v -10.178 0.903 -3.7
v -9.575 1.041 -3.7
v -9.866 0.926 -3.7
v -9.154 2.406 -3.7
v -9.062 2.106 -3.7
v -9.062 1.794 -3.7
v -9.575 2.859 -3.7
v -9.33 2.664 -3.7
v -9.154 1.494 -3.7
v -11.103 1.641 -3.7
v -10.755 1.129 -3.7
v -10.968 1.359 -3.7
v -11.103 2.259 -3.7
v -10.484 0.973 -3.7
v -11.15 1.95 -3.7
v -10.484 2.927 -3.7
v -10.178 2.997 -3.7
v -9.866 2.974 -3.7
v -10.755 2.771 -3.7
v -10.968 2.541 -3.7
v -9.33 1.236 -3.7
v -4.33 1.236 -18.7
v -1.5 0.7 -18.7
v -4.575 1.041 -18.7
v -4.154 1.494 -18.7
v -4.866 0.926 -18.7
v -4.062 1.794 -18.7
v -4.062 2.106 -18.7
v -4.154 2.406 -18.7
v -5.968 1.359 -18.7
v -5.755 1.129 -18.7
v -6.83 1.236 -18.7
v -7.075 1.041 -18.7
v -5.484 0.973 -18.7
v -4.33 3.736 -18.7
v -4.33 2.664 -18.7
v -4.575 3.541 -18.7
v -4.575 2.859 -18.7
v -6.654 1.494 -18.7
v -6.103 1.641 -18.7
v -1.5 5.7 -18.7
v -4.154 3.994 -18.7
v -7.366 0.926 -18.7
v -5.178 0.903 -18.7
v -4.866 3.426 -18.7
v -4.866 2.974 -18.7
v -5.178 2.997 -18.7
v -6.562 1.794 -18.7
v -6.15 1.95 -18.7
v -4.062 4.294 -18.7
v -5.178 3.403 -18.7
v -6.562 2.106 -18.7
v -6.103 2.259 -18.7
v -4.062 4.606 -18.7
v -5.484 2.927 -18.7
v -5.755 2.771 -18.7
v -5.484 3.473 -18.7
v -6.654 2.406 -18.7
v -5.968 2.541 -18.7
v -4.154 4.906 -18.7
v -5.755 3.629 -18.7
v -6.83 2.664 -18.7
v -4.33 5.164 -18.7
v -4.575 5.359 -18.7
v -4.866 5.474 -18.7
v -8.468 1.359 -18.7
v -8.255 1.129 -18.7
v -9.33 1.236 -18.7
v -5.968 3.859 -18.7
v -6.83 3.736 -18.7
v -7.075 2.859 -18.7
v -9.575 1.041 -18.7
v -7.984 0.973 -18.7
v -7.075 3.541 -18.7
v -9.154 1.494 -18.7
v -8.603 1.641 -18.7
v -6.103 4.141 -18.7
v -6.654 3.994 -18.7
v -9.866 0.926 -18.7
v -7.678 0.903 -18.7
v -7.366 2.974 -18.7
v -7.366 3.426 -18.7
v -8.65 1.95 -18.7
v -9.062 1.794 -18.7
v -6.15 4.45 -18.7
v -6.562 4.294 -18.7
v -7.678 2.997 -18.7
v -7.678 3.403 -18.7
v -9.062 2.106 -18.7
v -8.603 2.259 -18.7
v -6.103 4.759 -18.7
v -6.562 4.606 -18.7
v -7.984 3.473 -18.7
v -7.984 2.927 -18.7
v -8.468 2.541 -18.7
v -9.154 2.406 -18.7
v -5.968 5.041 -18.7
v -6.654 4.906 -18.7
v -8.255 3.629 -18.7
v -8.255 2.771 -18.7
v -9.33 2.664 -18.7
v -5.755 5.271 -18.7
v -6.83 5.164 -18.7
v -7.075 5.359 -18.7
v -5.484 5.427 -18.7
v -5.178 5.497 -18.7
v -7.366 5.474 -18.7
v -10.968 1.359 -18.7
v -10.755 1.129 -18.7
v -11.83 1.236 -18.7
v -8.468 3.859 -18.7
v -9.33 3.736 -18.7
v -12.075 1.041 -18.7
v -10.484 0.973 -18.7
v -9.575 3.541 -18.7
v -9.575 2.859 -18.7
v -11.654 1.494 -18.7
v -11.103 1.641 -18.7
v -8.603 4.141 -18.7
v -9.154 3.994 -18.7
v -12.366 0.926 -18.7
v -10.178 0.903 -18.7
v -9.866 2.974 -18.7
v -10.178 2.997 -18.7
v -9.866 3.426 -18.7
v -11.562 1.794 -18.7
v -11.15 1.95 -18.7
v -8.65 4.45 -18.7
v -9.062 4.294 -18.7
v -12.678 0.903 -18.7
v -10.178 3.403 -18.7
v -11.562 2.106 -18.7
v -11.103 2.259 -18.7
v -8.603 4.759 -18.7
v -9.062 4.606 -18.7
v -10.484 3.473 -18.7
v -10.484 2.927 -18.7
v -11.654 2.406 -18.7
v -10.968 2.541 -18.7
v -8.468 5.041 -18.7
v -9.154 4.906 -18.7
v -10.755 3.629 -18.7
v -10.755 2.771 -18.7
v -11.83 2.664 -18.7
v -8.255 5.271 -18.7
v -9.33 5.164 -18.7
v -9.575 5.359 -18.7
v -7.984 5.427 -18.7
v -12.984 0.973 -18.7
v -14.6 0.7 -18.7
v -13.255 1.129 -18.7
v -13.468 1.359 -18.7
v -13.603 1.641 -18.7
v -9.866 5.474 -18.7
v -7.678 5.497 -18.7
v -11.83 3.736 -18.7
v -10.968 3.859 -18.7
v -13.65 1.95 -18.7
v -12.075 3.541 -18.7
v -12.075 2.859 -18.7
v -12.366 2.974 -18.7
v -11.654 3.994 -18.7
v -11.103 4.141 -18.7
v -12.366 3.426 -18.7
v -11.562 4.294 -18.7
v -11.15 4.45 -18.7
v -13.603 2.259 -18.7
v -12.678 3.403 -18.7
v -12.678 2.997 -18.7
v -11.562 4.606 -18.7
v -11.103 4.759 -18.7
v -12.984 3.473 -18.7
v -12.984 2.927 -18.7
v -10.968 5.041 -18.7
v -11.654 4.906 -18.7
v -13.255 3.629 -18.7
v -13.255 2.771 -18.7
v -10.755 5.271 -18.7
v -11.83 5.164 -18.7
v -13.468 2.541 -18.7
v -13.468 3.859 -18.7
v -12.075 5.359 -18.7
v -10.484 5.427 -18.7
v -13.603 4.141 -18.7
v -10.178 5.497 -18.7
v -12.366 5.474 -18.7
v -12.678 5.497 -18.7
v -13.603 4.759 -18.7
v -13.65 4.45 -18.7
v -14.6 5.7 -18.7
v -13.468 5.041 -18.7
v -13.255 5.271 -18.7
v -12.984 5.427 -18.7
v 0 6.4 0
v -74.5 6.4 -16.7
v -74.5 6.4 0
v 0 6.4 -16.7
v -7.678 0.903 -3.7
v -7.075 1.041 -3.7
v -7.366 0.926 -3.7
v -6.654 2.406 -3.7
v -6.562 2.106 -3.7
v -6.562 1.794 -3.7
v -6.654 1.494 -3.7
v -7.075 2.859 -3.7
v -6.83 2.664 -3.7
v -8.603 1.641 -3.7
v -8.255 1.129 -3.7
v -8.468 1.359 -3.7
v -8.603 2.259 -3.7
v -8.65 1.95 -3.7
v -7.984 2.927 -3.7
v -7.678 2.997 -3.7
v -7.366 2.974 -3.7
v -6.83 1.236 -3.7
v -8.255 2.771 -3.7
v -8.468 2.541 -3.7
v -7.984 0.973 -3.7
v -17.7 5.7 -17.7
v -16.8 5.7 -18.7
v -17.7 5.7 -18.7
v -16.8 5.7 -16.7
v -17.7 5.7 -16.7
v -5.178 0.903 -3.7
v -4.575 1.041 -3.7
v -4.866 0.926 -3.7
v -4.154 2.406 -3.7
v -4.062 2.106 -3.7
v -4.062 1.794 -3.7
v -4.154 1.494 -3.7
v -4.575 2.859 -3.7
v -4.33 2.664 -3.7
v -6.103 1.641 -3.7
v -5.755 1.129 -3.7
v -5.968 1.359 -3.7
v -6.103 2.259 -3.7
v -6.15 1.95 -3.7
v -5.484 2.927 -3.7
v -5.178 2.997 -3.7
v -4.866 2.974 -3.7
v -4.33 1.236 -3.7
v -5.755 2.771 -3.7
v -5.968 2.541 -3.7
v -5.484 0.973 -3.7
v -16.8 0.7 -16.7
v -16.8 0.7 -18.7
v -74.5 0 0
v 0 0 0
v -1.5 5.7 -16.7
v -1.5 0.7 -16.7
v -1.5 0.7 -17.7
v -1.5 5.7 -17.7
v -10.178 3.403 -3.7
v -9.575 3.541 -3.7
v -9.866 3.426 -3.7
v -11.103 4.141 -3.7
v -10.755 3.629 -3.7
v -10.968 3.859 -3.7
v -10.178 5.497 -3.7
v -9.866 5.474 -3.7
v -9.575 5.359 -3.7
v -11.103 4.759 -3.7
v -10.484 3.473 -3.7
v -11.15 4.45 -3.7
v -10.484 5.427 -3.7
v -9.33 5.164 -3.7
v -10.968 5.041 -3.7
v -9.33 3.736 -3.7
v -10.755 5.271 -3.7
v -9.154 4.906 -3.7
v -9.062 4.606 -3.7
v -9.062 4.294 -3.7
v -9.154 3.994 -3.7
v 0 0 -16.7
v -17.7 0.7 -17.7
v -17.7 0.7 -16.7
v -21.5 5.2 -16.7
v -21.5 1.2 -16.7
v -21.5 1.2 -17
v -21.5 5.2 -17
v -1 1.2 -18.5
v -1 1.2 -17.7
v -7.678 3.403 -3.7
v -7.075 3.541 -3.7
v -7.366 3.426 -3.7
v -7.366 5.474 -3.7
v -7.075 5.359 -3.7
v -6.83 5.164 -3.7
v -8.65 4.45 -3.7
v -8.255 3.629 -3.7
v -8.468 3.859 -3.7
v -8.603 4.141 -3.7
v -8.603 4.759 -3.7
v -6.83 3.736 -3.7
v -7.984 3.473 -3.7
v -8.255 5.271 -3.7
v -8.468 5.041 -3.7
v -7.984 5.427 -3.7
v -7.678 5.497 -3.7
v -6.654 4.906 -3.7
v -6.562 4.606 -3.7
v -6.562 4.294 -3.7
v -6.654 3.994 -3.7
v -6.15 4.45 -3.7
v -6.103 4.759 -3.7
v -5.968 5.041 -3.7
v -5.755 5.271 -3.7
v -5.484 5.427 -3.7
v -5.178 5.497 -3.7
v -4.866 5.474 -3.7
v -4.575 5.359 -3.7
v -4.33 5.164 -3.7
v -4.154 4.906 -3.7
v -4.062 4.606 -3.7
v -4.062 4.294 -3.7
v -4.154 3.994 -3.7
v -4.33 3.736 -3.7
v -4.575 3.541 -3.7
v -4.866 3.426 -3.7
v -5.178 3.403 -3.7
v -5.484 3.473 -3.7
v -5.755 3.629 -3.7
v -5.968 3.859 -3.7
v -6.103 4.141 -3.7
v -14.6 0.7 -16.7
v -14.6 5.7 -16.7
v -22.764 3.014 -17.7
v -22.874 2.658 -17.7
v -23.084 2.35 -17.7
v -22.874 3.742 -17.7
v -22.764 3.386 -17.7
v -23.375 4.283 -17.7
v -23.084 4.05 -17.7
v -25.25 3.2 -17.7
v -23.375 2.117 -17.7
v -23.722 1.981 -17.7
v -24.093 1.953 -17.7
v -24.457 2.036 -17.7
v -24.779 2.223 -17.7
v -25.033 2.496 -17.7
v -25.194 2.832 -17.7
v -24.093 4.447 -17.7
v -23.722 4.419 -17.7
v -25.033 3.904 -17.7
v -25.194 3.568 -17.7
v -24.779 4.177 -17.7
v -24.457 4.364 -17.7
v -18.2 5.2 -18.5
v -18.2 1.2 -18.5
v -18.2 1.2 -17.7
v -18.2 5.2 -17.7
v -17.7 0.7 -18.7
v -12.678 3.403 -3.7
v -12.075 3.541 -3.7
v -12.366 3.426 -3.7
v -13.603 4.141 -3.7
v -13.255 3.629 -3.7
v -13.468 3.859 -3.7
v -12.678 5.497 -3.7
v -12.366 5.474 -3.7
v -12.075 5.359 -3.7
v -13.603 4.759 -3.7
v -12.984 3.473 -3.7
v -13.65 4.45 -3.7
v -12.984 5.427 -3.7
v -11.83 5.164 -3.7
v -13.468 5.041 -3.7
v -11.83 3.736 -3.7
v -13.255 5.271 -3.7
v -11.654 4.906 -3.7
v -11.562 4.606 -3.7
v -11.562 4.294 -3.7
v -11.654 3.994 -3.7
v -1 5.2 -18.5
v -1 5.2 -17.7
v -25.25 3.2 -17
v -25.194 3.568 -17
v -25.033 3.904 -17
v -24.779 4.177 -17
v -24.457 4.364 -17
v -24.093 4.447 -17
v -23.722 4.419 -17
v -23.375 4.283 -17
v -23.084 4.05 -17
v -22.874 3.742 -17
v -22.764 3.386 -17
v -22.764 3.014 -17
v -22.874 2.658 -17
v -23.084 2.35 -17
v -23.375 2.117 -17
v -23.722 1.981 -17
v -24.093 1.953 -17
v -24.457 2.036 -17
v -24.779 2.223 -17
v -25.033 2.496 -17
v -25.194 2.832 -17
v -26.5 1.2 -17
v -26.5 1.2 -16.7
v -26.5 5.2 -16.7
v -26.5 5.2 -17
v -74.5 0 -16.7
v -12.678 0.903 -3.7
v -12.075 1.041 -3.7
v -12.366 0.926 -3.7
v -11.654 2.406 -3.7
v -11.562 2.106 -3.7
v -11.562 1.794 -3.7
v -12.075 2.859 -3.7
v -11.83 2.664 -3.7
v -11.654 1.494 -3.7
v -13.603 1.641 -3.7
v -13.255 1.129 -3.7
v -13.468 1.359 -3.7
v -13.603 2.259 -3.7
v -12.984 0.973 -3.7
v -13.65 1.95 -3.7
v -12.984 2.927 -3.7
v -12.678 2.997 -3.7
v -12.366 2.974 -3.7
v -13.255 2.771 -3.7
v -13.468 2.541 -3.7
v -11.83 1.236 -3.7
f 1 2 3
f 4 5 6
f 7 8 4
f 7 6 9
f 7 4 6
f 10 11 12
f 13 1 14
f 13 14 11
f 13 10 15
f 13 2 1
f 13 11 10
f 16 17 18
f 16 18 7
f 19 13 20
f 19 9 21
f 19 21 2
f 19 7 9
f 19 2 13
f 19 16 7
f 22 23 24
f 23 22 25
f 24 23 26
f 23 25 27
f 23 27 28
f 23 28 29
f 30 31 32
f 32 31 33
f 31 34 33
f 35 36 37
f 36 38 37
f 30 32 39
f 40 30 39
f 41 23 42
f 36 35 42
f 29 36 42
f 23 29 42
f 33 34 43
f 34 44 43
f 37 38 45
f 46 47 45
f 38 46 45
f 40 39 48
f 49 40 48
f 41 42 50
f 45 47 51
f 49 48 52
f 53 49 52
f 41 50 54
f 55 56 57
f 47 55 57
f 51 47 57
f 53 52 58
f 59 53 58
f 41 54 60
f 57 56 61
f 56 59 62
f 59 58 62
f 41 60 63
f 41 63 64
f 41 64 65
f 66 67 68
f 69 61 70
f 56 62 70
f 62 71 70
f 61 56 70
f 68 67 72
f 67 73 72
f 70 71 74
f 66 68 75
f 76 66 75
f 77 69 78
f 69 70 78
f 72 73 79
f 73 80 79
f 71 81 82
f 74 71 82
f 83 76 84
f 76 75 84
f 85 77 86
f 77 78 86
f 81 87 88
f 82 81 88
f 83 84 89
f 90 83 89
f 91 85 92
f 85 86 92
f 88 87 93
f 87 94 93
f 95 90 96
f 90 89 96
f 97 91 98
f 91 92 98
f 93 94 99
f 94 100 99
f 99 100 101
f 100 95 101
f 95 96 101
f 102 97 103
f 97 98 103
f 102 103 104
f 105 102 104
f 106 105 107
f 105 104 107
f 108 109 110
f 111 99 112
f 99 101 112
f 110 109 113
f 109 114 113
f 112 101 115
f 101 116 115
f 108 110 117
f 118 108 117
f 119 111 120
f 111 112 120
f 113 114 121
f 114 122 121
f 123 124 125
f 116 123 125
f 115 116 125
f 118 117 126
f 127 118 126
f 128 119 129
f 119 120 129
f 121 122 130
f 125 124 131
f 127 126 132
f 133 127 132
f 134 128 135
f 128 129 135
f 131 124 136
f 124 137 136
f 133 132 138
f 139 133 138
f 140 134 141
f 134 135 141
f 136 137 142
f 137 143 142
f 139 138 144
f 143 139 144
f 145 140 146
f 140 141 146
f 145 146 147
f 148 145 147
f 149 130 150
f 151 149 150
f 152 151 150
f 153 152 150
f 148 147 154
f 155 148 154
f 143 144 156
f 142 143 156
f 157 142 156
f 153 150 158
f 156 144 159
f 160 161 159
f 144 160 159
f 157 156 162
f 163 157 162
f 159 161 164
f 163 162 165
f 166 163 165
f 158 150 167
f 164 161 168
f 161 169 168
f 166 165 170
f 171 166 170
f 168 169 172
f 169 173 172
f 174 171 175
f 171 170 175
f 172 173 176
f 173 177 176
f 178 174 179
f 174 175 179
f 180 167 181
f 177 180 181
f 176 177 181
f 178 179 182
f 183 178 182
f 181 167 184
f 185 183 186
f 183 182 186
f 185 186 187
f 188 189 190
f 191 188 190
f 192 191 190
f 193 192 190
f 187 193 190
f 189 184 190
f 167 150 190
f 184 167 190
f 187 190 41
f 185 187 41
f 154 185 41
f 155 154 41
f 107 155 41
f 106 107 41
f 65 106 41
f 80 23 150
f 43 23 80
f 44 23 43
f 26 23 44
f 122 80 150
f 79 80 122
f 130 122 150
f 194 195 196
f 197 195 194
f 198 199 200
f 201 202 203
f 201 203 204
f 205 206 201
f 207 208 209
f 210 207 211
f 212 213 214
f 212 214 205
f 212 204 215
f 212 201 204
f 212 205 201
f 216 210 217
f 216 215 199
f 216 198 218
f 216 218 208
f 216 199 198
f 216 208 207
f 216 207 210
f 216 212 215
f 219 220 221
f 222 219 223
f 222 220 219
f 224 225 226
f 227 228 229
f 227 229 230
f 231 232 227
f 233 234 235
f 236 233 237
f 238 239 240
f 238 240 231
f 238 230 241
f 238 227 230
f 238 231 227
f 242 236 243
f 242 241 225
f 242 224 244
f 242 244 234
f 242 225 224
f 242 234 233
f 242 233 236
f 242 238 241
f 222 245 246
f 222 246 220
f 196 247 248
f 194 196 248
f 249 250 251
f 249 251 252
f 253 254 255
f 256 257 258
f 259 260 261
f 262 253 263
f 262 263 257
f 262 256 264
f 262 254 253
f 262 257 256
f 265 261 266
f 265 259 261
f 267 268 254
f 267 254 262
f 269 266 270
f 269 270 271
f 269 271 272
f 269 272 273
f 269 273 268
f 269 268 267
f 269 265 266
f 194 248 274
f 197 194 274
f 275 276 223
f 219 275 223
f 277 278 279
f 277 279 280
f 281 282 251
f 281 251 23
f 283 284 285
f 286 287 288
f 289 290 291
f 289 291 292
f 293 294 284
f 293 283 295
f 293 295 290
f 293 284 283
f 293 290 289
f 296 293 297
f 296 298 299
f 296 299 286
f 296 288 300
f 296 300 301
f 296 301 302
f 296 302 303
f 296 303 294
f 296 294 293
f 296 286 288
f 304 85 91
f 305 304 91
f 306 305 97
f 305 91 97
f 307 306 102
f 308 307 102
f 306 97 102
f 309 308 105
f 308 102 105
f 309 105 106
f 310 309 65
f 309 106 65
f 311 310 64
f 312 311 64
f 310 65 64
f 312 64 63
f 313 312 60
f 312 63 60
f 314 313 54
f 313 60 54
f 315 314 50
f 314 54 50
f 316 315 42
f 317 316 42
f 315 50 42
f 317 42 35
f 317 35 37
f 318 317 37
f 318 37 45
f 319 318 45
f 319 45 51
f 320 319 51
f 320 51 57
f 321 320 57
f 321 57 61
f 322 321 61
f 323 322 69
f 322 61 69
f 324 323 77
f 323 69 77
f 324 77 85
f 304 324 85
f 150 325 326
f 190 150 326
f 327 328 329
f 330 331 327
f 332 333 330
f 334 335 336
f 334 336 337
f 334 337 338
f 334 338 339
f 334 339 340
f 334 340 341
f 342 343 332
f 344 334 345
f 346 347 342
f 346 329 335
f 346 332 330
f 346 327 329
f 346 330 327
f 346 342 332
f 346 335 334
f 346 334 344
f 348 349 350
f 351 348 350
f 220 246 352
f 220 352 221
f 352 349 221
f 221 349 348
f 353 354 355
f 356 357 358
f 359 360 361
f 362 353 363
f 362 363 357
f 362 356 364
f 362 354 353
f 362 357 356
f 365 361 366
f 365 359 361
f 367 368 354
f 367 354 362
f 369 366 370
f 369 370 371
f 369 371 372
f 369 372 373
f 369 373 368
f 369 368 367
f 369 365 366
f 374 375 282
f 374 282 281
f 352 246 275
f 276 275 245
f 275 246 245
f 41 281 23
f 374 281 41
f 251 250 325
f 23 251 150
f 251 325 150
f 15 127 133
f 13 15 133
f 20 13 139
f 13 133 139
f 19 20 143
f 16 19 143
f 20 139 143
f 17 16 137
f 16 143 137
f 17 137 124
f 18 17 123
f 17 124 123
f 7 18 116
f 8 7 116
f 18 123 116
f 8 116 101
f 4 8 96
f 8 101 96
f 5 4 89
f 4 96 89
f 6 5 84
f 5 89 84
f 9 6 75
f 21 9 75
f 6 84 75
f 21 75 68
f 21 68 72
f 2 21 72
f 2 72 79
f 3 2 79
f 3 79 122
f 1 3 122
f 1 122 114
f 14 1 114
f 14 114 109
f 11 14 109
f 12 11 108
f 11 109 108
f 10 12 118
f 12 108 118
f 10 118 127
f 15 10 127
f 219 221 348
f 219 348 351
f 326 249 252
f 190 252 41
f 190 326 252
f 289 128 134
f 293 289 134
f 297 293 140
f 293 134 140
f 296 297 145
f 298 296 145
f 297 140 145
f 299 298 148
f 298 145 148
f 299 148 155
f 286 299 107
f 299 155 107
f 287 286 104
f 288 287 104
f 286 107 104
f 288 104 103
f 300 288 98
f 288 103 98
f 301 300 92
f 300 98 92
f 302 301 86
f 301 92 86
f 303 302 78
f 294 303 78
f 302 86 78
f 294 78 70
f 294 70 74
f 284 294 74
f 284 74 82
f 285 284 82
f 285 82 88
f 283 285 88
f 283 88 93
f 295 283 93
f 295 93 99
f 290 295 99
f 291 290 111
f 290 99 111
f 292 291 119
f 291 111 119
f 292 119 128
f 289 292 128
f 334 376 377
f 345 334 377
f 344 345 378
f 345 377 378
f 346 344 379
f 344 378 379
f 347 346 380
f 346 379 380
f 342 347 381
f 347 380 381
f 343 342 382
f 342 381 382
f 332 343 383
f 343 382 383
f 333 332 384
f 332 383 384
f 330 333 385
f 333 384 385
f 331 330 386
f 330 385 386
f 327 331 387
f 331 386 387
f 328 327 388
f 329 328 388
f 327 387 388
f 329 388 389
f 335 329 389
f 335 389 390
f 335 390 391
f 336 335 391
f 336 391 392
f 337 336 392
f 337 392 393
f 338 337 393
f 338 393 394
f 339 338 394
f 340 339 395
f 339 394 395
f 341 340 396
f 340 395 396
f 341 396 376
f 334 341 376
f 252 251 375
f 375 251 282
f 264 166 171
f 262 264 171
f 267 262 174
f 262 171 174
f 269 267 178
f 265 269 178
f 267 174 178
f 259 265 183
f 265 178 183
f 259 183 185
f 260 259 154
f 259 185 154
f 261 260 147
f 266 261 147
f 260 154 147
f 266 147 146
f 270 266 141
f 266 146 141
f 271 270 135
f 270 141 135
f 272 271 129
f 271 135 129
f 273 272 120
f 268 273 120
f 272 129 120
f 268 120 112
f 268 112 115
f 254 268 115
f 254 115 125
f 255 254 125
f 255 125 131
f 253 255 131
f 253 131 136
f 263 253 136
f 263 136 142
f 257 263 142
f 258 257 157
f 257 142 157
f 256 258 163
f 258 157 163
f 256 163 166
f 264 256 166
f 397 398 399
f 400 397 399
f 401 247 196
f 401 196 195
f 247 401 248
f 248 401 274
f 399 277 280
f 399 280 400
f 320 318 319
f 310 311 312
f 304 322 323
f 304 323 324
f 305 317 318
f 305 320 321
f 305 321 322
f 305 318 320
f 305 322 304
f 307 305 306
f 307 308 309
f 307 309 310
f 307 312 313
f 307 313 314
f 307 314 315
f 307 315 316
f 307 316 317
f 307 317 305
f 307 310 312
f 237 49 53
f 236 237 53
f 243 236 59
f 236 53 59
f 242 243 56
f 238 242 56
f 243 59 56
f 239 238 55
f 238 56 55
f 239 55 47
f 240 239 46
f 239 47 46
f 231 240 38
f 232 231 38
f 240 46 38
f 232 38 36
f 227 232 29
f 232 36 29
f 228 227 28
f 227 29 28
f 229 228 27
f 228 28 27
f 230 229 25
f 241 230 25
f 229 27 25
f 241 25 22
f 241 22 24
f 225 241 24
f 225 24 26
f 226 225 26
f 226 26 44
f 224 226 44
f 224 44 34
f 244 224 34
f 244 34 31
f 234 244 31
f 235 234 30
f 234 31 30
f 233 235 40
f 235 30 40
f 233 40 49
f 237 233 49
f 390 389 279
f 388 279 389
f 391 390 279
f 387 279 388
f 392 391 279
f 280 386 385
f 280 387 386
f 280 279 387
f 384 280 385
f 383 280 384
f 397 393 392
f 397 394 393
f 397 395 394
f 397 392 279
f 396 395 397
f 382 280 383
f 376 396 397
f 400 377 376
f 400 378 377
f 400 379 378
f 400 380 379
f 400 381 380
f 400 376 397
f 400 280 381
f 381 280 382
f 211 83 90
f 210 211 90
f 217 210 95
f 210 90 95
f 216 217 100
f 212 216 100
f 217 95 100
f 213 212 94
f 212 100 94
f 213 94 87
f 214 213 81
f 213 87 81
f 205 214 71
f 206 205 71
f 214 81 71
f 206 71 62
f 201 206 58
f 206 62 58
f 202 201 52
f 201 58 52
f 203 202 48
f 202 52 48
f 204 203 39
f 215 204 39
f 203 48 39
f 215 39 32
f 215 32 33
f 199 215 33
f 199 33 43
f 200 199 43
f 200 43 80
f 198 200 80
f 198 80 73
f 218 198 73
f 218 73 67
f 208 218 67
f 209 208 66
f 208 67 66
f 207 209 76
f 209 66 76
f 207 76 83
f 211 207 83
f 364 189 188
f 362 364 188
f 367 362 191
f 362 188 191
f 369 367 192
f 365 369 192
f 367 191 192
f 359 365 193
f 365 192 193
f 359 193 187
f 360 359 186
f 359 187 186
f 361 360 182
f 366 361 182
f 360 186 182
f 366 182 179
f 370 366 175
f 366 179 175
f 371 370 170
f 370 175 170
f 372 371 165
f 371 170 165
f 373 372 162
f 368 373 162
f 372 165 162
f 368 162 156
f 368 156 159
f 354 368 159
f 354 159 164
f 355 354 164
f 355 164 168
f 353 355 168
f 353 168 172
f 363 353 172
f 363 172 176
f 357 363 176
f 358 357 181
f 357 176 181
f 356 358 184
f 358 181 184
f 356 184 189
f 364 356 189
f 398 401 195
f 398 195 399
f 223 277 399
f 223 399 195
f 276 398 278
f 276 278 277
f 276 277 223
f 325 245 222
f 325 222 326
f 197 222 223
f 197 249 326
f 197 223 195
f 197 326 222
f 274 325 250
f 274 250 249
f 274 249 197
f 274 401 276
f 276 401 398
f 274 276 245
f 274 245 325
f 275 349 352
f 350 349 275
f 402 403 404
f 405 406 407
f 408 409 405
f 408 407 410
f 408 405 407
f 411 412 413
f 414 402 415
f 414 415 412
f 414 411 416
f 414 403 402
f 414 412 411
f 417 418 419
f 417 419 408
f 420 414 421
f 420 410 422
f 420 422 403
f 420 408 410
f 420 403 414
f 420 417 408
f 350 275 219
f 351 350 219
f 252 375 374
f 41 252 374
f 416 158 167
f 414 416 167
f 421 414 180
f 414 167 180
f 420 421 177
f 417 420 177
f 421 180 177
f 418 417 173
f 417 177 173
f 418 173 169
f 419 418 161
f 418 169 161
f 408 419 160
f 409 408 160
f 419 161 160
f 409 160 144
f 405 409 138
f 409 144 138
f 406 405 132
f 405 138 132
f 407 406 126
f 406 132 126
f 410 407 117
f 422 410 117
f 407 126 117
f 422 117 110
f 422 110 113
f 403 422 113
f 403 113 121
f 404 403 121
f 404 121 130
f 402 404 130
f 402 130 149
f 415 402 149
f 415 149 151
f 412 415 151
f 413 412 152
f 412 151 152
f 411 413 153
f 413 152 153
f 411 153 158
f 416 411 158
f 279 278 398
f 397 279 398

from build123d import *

# Parameters (mm, degrees)
SKETCH1_W             = 74.5
SKETCH1_H             = 16.7
BOSS_EXTRUDE1_DEPTH   = 6.4
SKETCH2_W             = 13.1
SKETCH2_H             = 5
SKETCH2_W_2           = 0.9
BOSS_EXTRUDE2_DEPTH   = 2
SKETCH3_R             = 1.05
CUT_EXTRUDE1_DEPTH    = 15
SKETCH4_W             = 1
SKETCH4_H             = 5
BOSS_EXTRUDE3_DEPTH   = 0.5
SKETCH5_W             = 1
SKETCH5_H             = 5
BOSS_EXTRUDE4_DEPTH   = 0.5
CHAMFER2_SIZE         = 0.5
CHAMFER2_SIZE2        = 0.2
CHAMFER2_PART_2_SIZE  = 0.5
CHAMFER2_PART_2_SIZE2 = 0.2
CHAMFER1_SIZE         = 0.5
SKETCH6_W             = 5
SKETCH6_H             = 4
BOSS_EXTRUDE5_DEPTH   = 0.3
SKETCH7_R             = 1.25
BOSS_EXTRUDE6_DEPTH   = 0.7


with BuildPart() as part:
    # Sketch1 → Boss-Extrude1 (new body)
    with BuildSketch(Plane(origin=(0, 0, 0), x_dir=(1, 0, 0), z_dir=(0, 1, 0))):
        with Locations((-37.25, 8.35)):
            Rectangle(SKETCH1_W, SKETCH1_H)
    extrude(amount=BOSS_EXTRUDE1_DEPTH)

    # Sketch2 → Boss-Extrude2 (add)
    with BuildSketch(Plane(origin=(0, 0, -16.7), x_dir=(-1, 0, 0), z_dir=(0, 0, -1))):
        with Locations((8.05, 3.2)):
            Rectangle(SKETCH2_W, SKETCH2_H)
        with Locations((17.25, 3.2)):
            Rectangle(SKETCH2_W_2, SKETCH2_H)
    extrude(amount=BOSS_EXTRUDE2_DEPTH)

    # Sketch3 → Cut-Extrude1 (cut)
    with BuildSketch(Plane(origin=(0, 0, -18.7), x_dir=(-1, 0, 0), z_dir=(0, 0, -1))):
        with Locations((5.1, 4.45)):
            Circle(SKETCH3_R)
        with Locations((7.6, 4.45)):
            Circle(SKETCH3_R)
        with Locations((10.1, 4.45)):
            Circle(SKETCH3_R)
        with Locations((12.6, 4.45)):
            Circle(SKETCH3_R)
        with Locations((12.6, 1.95)):
            Circle(SKETCH3_R)
        with Locations((10.1, 1.95)):
            Circle(SKETCH3_R)
        with Locations((7.6, 1.95)):
            Circle(SKETCH3_R)
        with Locations((5.1, 1.95)):
            Circle(SKETCH3_R)
    extrude(amount=-CUT_EXTRUDE1_DEPTH, mode=Mode.SUBTRACT)

    # Sketch4 → Boss-Extrude3 (add)
    with BuildSketch(Plane(origin=(-1.5, 0, 0), x_dir=(0, 0, -1), z_dir=(1, 0, 0))):
        with Locations((18.2, 3.2)):
            Rectangle(SKETCH4_W, SKETCH4_H)
    extrude(amount=BOSS_EXTRUDE3_DEPTH)

    # Sketch5 → Boss-Extrude4 (add)
    with BuildSketch(Plane.ZY.offset(17.7)):
        with Locations((-18.2, 3.2)):
            Rectangle(SKETCH5_W, SKETCH5_H)
    extrude(amount=BOSS_EXTRUDE4_DEPTH)

    # Chamfer2
    chamfer2_edges = [part.edges().sort_by_distance(p)[0] for p in [
        (-1, 3.2, -18.7),
    ]]
    chamfer2_side = [part.faces().sort_by_distance(p)[0] for p in [
        (-7.077898805, 3.2, -18.7),
    ]]
    chamfer(chamfer2_edges, length=CHAMFER2_SIZE, length2=CHAMFER2_SIZE2, reference=chamfer2_side[0])

    # Chamfer2 part 2
    chamfer2_part_2_edges = [part.edges().sort_by_distance(p)[0] for p in [
        (-18.2, 3.2, -18.7),
    ]]
    chamfer2_part_2_side = [part.faces().sort_by_distance(p)[0] for p in [
        (-17.5, 3.2, -18.7),
    ]]
    chamfer(chamfer2_part_2_edges, length=CHAMFER2_PART_2_SIZE, length2=CHAMFER2_PART_2_SIZE2, reference=chamfer2_part_2_side[0])

    # Chamfer1
    chamfer1_edges = [part.edges().sort_by_distance(p)[0] for p in [
        (-18.2, 0.7, -18.1),
        (-18.2, 5.7, -18.1),
        (-1, 5.7, -18.1),
        (-1, 0.7, -18.1),
    ]]
    chamfer(chamfer1_edges, length=CHAMFER1_SIZE)

    # Sketch6 → Boss-Extrude5 (add)
    with BuildSketch(Plane(origin=(0, 0, -16.7), x_dir=(-1, 0, 0), z_dir=(0, 0, -1))):
        with Locations((24, 3.2)):
            Rectangle(SKETCH6_W, SKETCH6_H)
    extrude(amount=BOSS_EXTRUDE5_DEPTH)

    # Sketch7 → Boss-Extrude6 (add)
    with BuildSketch(Plane(origin=(0, 0, -17), x_dir=(-1, 0, 0), z_dir=(0, 0, -1))):
        with Locations((24, 3.2)):
            Circle(SKETCH7_R)
    extrude(amount=BOSS_EXTRUDE6_DEPTH)


solid = part.part
